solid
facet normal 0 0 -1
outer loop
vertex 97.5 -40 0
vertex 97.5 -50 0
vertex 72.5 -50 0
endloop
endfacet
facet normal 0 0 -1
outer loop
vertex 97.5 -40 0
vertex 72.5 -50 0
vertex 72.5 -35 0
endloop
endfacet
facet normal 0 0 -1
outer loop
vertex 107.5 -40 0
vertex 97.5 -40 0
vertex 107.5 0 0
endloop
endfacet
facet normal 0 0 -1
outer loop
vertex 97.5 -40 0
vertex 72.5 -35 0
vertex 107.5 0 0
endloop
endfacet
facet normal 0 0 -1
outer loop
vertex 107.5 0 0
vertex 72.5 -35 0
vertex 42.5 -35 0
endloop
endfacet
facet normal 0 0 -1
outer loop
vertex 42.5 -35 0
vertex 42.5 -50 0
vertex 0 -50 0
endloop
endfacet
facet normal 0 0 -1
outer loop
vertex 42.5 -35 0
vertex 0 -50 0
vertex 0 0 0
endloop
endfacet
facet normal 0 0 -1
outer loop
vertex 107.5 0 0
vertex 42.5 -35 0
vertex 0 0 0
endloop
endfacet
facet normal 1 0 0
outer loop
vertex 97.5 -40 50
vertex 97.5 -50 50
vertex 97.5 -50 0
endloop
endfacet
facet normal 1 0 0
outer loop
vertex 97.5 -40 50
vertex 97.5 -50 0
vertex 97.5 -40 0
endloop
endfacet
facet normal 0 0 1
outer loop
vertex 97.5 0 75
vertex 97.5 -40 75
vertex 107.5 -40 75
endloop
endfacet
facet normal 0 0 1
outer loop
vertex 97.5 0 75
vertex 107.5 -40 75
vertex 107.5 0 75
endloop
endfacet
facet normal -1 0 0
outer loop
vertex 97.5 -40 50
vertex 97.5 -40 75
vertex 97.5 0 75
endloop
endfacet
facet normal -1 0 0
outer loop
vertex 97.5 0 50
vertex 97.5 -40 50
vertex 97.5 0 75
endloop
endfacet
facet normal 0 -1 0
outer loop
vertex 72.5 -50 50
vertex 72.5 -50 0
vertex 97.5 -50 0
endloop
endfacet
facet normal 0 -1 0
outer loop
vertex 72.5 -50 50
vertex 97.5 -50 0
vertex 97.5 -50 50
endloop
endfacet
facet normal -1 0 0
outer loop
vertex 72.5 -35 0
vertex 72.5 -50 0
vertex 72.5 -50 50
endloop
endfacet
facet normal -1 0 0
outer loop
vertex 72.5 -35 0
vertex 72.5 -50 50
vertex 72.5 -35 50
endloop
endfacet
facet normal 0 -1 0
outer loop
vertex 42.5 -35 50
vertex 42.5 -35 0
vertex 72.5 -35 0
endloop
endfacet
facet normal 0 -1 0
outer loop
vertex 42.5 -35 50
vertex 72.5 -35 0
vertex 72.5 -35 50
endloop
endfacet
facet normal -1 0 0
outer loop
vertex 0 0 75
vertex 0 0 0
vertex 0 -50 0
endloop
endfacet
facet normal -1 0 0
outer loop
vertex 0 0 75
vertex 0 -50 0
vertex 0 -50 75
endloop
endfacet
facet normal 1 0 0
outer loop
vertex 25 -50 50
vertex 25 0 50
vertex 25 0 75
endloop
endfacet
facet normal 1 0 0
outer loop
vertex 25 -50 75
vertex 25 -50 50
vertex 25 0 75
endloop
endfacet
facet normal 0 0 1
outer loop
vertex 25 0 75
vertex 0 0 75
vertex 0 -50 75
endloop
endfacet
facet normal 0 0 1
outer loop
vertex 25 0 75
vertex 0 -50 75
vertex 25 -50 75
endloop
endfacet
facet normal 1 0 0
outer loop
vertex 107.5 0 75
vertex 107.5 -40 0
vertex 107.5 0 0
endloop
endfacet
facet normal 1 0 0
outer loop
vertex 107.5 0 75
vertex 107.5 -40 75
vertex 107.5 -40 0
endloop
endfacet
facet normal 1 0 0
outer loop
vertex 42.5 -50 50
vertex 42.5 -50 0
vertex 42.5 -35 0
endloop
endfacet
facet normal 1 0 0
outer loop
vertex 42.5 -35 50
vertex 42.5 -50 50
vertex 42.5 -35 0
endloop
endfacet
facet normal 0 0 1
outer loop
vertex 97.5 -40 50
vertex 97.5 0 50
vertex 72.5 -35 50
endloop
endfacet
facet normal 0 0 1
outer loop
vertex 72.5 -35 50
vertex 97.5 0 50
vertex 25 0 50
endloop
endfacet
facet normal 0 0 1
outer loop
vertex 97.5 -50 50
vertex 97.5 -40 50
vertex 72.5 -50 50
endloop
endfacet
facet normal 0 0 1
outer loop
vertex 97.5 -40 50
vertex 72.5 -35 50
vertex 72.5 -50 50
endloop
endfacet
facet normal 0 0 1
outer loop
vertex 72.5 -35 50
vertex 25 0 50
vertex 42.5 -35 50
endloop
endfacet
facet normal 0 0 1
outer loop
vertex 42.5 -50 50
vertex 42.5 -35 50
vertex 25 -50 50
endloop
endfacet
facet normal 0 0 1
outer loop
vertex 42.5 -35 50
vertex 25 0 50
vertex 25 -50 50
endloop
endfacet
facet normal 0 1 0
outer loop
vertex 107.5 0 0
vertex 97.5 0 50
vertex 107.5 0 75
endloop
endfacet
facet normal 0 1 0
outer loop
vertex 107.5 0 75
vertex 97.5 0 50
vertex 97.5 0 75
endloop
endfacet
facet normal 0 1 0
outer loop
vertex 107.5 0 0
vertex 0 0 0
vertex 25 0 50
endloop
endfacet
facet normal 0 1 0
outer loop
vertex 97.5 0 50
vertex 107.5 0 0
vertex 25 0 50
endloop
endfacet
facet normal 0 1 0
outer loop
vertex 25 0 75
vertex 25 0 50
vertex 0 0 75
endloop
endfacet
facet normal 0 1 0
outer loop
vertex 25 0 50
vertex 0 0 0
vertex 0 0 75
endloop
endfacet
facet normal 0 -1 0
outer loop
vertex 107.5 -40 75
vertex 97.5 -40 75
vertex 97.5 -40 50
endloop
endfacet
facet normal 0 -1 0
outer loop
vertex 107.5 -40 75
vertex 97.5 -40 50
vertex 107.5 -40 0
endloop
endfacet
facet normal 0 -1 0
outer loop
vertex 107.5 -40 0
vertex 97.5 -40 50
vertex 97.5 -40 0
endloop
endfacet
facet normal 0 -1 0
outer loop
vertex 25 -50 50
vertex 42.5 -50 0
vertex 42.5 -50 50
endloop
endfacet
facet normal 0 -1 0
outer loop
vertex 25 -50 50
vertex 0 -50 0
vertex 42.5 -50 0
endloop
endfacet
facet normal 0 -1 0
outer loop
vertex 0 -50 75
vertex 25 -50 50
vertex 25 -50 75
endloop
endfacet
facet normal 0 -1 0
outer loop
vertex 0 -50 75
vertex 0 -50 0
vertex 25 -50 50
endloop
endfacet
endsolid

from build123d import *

# Parameters (mm, degrees)
F0_W     = 25
F0_H     = 75
F1_DEPTH = 50
F2_W     = 50
F2_H     = 50
F3_DEPTH = 17.5
F4_W     = 35
F4_H     = 50
F5_DEPTH = 30
F6_W     = 15
F6_H     = 50
F6_W_2   = 35
F7_DEPTH = 25
F8_W     = 40
F8_H     = 50
F8_H_2   = 25
F9_DEPTH = 10


with BuildPart() as f1:
    # F0 (on Front) → F1 (new body)
    with BuildSketch(Plane.XZ):
        with Locations((12.5, 37.5)):
            Rectangle(F0_W, F0_H)
    extrude(amount=F1_DEPTH)

    # F2 (on face) → F3 (join)
    with BuildSketch(Plane.YZ.offset(25)):
        with Locations((-25, 25)):
            Rectangle(F2_W, F2_H)
    extrude(amount=F3_DEPTH)

    # F4 (on face) → F5 (join)
    with BuildSketch(Plane.YZ.offset(42.5)):
        with Locations((-17.5, 25)):
            Rectangle(F4_W, F4_H)
    extrude(amount=F5_DEPTH)

    # F6 (on face) → F7 (join)
    with BuildSketch(Plane.YZ.offset(72.5)):
        with Locations((-42.5, 25)):
            Rectangle(F6_W, F6_H)
        with Locations((-17.5, 25)):
            Rectangle(F6_W_2, F6_H)
    extrude(amount=F7_DEPTH)

    # F8 (on face) → F9 (join)
    with BuildSketch(Plane.YZ.offset(97.5)):
        with Locations((-20, 25)):
            Rectangle(F8_W, F8_H)
        with Locations((-20, 62.5)):
            Rectangle(F8_W, F8_H_2)
    extrude(amount=F9_DEPTH)


solid = f1.part
